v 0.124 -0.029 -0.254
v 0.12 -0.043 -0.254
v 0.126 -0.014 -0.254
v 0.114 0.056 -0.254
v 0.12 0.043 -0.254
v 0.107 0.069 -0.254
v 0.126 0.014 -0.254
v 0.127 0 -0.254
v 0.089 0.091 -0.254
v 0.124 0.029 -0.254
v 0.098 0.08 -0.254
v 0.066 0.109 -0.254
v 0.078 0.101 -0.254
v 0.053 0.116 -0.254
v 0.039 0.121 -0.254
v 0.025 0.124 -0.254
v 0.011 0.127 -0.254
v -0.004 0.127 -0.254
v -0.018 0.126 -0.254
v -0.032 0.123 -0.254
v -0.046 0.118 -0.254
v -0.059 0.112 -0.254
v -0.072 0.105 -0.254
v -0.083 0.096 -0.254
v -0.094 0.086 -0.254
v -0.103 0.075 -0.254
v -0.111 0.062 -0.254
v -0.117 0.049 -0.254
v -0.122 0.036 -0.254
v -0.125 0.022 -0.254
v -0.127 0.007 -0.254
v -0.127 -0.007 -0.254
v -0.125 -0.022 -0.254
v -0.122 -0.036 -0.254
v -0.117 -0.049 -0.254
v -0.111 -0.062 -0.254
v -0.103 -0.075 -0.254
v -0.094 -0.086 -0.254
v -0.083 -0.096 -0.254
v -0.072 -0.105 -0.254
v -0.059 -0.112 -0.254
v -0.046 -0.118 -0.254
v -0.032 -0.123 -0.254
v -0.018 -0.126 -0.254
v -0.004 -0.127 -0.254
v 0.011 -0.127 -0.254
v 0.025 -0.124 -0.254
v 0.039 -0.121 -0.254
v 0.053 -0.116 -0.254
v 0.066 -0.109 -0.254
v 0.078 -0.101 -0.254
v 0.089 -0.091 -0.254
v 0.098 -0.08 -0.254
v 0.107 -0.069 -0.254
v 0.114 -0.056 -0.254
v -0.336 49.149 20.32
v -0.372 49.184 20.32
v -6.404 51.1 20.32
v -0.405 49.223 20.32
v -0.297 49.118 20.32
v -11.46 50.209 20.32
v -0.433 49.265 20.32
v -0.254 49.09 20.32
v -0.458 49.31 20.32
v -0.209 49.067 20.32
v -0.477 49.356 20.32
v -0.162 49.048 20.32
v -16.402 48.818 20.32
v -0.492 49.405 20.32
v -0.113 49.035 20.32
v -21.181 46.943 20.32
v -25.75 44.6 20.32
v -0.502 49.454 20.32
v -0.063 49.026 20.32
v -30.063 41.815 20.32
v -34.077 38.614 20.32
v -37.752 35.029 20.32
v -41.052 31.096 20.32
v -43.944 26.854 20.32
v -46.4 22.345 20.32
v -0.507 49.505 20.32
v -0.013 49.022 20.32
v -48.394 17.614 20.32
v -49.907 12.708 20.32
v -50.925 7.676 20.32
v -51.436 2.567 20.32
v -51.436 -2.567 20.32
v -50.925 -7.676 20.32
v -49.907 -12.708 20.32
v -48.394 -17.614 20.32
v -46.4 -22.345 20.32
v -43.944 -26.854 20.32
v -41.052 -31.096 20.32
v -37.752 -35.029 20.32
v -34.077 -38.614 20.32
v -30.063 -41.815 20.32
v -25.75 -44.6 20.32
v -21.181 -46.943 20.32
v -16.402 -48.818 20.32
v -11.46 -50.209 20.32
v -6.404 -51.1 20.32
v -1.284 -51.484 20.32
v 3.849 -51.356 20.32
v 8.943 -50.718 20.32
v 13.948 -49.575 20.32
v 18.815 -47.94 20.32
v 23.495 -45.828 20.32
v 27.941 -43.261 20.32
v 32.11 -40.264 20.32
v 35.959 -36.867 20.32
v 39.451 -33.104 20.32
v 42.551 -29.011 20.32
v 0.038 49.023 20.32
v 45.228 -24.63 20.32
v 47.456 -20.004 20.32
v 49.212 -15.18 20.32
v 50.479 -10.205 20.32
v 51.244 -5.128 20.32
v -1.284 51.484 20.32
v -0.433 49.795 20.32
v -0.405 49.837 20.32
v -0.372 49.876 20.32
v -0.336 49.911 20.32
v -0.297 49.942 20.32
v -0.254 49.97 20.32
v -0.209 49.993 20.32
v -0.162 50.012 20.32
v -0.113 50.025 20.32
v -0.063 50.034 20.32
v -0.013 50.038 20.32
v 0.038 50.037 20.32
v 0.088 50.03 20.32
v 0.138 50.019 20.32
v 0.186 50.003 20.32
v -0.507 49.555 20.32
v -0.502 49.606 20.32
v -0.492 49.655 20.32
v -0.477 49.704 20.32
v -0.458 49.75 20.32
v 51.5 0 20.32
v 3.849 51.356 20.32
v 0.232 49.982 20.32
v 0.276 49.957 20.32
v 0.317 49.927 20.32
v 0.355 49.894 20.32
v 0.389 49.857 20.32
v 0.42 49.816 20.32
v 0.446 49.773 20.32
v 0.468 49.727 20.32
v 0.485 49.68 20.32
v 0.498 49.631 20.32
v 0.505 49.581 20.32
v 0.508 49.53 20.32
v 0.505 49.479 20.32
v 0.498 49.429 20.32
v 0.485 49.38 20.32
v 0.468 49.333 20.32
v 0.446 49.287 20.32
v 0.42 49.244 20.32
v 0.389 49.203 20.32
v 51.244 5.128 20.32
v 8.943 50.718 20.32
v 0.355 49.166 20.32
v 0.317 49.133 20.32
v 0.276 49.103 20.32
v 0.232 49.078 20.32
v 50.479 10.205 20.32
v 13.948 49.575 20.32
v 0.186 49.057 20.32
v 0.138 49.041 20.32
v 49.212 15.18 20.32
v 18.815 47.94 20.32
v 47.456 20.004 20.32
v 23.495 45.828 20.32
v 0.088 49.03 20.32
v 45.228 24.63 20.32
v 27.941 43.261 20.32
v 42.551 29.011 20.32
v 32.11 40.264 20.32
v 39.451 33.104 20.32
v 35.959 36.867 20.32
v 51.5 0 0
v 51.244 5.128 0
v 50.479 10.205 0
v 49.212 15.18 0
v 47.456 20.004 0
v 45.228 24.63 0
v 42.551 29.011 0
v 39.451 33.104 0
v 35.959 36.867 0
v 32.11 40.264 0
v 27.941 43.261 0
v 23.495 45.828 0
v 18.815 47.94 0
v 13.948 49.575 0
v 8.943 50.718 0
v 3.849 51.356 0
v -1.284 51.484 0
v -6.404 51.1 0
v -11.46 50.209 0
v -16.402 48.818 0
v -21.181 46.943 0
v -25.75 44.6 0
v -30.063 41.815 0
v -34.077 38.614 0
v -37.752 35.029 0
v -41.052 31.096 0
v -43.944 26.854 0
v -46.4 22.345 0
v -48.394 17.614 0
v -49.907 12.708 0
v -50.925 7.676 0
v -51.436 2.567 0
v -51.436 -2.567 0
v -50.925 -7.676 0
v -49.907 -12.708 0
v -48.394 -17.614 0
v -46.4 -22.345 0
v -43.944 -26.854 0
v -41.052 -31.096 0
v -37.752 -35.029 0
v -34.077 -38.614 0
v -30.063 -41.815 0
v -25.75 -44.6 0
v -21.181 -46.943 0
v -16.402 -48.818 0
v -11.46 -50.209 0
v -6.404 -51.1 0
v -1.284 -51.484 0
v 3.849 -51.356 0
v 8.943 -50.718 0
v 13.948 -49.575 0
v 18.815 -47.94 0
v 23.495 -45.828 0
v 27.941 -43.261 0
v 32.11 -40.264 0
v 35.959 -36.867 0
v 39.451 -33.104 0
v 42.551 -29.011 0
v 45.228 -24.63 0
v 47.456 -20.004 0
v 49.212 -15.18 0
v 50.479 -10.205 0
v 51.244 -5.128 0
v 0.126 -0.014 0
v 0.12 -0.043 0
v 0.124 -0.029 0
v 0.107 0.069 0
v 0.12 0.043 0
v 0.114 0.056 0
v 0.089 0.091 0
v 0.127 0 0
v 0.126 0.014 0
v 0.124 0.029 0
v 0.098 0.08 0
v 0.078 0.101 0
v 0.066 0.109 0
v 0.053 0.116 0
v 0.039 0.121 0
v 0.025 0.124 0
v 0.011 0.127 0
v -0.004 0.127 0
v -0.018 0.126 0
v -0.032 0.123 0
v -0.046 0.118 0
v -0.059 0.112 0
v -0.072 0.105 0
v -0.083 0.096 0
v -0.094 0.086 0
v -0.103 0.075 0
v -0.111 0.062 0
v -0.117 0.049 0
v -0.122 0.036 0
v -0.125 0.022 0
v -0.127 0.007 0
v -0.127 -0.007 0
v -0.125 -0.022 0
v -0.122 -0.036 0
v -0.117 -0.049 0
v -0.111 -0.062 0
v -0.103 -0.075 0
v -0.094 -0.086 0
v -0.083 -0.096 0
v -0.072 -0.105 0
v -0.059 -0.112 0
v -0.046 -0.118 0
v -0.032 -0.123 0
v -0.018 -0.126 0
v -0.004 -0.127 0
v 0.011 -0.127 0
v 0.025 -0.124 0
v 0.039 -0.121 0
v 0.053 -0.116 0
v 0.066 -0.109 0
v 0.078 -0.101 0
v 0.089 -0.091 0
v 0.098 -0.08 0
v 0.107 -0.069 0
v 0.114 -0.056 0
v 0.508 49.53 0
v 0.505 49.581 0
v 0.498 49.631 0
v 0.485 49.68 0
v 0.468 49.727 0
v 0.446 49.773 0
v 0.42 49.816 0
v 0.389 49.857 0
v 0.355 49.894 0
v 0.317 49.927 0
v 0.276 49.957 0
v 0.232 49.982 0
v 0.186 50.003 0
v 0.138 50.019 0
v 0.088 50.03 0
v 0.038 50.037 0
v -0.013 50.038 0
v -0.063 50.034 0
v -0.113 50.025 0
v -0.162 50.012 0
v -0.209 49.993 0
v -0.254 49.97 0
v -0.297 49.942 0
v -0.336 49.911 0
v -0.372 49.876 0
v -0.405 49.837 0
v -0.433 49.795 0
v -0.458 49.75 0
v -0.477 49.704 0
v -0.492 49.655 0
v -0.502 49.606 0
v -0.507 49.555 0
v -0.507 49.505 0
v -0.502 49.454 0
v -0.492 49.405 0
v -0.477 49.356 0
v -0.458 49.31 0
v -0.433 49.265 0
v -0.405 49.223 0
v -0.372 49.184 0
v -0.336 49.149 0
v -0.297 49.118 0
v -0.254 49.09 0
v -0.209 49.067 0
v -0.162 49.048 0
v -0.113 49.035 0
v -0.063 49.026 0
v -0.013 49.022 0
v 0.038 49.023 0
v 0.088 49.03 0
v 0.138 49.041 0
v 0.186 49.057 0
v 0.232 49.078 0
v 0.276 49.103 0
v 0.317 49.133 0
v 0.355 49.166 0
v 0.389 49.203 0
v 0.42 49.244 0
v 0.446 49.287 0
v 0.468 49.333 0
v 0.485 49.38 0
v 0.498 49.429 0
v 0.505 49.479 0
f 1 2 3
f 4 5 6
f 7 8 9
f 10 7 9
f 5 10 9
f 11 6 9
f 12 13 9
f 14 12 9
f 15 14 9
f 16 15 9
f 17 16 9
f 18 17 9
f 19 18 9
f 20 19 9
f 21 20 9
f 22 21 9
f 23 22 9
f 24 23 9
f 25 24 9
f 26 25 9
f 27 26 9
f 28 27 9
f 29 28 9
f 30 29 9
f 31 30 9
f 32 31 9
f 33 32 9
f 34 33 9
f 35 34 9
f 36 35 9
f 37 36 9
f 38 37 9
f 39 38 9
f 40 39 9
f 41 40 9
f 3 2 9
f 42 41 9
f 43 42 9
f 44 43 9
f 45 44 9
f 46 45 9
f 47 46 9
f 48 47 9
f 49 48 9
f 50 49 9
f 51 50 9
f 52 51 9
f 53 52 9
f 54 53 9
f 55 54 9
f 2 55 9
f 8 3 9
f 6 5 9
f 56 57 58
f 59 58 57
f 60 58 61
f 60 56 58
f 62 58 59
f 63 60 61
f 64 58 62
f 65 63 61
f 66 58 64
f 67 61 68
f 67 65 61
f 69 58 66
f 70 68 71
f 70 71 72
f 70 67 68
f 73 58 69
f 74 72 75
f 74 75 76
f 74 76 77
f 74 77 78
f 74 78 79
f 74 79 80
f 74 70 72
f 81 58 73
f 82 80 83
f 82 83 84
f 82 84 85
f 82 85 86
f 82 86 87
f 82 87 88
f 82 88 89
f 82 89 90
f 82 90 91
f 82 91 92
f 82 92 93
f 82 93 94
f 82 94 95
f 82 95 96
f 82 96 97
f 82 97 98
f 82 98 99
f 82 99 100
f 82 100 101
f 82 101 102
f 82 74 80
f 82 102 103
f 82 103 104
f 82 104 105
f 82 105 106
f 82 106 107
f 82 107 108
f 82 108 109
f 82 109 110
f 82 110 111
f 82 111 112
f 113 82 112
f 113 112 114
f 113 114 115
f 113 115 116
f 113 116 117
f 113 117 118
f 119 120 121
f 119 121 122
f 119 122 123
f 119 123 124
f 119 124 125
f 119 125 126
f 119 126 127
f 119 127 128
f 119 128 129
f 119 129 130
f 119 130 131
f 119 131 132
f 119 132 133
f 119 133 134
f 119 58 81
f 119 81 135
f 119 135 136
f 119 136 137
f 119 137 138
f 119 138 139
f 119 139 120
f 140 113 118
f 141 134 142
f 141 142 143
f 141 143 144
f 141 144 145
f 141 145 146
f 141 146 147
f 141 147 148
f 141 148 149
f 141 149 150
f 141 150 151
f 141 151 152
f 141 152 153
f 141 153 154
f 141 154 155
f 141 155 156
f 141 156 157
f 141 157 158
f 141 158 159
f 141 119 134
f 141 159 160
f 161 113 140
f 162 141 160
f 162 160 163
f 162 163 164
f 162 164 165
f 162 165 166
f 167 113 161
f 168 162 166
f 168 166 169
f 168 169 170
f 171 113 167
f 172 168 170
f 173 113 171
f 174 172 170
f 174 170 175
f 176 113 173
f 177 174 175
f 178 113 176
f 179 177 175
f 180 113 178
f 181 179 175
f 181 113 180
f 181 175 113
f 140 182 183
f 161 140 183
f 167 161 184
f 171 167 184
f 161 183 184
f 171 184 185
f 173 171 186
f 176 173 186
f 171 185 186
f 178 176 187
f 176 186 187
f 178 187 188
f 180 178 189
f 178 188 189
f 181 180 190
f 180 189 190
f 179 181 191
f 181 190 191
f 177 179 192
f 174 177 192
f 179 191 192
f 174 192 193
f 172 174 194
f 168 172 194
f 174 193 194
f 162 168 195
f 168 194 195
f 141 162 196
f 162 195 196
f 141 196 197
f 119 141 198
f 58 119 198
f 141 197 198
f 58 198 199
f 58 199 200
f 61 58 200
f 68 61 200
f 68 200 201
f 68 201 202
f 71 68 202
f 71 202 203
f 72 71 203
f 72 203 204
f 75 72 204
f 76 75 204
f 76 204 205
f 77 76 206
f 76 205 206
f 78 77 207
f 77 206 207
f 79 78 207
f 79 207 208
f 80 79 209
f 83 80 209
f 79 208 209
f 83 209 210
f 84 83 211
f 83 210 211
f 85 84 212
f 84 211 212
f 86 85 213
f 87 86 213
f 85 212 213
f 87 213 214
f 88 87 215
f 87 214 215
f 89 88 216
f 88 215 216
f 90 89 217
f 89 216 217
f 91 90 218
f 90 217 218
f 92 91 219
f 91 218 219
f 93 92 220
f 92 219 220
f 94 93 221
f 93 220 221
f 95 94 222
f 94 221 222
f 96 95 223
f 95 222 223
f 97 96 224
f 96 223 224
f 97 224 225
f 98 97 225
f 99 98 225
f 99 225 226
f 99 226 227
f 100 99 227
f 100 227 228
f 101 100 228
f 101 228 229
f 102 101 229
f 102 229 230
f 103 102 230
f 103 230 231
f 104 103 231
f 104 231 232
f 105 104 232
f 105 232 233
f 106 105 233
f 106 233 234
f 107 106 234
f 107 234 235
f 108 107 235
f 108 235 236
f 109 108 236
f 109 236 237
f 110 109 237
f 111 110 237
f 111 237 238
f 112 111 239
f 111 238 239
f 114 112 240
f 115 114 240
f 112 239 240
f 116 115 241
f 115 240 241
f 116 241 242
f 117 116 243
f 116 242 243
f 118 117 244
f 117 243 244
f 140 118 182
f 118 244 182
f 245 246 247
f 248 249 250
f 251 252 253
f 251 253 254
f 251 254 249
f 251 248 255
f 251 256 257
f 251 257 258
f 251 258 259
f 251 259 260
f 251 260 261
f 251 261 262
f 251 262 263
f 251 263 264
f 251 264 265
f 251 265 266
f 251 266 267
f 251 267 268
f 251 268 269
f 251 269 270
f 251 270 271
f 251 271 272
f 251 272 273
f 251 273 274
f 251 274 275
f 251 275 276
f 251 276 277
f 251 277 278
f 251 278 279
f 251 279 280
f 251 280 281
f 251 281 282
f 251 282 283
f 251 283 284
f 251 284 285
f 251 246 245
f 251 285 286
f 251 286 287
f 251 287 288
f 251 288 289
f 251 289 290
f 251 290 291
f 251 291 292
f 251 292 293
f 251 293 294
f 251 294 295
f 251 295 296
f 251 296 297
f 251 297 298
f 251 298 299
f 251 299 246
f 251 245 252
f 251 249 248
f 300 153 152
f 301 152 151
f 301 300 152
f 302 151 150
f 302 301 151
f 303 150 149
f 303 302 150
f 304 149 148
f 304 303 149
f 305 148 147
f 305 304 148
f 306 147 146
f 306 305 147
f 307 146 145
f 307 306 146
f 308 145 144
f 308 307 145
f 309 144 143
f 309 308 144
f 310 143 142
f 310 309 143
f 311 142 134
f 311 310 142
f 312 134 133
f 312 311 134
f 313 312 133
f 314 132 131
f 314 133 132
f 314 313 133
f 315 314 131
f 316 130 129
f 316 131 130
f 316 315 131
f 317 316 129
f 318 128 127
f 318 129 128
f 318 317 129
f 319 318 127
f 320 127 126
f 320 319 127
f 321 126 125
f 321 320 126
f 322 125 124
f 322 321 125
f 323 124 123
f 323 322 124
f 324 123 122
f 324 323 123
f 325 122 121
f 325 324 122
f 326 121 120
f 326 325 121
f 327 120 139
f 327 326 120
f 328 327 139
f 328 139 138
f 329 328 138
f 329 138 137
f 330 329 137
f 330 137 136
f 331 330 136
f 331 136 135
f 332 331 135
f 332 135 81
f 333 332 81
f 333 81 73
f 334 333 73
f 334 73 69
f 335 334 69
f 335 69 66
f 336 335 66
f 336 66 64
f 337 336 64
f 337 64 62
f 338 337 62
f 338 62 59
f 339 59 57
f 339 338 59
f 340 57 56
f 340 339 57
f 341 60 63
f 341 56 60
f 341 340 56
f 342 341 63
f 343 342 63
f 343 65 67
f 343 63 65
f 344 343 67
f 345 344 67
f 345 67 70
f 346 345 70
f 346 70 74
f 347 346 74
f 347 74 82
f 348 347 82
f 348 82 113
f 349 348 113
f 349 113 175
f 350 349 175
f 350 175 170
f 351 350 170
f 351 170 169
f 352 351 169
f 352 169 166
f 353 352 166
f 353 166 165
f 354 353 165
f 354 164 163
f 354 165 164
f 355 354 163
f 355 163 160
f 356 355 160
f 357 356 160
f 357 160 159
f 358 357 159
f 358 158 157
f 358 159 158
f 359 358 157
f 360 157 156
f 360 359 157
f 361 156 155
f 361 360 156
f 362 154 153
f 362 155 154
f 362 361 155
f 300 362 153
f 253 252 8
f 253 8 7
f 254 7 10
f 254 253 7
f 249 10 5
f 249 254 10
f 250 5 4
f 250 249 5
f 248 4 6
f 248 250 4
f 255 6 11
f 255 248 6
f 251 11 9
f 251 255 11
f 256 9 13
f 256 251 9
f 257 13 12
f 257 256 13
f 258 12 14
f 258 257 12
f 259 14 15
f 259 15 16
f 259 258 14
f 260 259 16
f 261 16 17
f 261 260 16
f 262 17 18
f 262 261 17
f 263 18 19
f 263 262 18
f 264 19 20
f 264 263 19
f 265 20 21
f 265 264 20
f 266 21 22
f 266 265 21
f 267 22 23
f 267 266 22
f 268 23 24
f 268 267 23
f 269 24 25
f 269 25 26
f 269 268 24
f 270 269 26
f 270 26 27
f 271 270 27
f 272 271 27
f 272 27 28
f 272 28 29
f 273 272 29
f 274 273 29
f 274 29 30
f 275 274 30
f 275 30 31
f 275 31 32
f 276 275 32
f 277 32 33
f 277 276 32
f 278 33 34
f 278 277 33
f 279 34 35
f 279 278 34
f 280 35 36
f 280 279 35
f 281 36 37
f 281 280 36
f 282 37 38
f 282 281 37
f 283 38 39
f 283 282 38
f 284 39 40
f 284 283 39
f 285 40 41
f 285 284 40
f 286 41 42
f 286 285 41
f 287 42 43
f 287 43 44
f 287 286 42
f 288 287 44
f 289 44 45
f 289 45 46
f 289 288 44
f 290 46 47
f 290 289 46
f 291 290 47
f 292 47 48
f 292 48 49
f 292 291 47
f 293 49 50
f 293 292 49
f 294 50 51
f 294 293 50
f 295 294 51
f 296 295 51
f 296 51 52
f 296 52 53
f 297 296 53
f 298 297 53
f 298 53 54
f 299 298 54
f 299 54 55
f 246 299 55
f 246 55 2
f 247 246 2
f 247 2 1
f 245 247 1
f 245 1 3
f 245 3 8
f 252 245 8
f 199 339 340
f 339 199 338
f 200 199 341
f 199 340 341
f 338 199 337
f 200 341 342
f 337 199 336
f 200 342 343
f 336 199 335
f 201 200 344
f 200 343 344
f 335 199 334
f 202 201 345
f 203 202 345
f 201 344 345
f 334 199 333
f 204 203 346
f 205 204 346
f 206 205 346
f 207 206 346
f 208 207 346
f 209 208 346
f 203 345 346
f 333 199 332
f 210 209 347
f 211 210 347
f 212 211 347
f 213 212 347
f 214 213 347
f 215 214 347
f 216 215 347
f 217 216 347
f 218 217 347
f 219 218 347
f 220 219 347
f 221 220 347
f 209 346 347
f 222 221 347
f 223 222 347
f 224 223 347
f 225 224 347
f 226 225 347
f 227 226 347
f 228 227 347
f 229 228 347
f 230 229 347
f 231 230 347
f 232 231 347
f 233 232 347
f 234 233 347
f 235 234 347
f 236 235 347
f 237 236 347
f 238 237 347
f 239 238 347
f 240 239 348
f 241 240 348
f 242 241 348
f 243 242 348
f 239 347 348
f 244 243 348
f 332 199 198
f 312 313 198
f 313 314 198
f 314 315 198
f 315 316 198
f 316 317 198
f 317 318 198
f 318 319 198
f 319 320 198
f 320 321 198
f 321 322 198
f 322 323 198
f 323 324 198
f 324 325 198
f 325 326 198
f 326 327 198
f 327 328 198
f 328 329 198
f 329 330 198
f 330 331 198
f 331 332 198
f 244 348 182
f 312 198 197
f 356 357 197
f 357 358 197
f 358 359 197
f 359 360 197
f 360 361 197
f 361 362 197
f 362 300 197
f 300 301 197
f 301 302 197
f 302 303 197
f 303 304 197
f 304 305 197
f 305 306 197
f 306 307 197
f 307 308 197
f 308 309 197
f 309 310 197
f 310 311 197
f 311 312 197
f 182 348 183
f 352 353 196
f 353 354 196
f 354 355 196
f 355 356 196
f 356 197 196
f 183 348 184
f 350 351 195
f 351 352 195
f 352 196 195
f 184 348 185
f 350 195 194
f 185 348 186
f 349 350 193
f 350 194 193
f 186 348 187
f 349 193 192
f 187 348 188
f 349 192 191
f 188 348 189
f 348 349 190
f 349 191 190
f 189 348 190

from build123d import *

# Parameters (mm, degrees)
F0_R     = 51.5
F1_DEPTH = 20.32
F3_R     = 0.127
F4_DEPTH = 0.254
F2_R     = 0.508
F5_DEPTH = 25.4


with BuildPart() as f1:
    # F0 (on Top) → F1 (new body)
    with BuildSketch(Plane.XY):
        Circle(F0_R)
    extrude(amount=F1_DEPTH)

    # F2 (on Top) → F5 (cut)
    with BuildSketch(Plane.XY):
        with Locations((0, 49.53)):
            Circle(F2_R)
    extrude(amount=F5_DEPTH, mode=Mode.SUBTRACT)


with BuildPart() as f4:
    # F3 (on Top) → F4 (new body)
    with BuildSketch(Plane.XY):
        Circle(F3_R)
    extrude(amount=-F4_DEPTH)


solid = Compound([f1.part, f4.part])
